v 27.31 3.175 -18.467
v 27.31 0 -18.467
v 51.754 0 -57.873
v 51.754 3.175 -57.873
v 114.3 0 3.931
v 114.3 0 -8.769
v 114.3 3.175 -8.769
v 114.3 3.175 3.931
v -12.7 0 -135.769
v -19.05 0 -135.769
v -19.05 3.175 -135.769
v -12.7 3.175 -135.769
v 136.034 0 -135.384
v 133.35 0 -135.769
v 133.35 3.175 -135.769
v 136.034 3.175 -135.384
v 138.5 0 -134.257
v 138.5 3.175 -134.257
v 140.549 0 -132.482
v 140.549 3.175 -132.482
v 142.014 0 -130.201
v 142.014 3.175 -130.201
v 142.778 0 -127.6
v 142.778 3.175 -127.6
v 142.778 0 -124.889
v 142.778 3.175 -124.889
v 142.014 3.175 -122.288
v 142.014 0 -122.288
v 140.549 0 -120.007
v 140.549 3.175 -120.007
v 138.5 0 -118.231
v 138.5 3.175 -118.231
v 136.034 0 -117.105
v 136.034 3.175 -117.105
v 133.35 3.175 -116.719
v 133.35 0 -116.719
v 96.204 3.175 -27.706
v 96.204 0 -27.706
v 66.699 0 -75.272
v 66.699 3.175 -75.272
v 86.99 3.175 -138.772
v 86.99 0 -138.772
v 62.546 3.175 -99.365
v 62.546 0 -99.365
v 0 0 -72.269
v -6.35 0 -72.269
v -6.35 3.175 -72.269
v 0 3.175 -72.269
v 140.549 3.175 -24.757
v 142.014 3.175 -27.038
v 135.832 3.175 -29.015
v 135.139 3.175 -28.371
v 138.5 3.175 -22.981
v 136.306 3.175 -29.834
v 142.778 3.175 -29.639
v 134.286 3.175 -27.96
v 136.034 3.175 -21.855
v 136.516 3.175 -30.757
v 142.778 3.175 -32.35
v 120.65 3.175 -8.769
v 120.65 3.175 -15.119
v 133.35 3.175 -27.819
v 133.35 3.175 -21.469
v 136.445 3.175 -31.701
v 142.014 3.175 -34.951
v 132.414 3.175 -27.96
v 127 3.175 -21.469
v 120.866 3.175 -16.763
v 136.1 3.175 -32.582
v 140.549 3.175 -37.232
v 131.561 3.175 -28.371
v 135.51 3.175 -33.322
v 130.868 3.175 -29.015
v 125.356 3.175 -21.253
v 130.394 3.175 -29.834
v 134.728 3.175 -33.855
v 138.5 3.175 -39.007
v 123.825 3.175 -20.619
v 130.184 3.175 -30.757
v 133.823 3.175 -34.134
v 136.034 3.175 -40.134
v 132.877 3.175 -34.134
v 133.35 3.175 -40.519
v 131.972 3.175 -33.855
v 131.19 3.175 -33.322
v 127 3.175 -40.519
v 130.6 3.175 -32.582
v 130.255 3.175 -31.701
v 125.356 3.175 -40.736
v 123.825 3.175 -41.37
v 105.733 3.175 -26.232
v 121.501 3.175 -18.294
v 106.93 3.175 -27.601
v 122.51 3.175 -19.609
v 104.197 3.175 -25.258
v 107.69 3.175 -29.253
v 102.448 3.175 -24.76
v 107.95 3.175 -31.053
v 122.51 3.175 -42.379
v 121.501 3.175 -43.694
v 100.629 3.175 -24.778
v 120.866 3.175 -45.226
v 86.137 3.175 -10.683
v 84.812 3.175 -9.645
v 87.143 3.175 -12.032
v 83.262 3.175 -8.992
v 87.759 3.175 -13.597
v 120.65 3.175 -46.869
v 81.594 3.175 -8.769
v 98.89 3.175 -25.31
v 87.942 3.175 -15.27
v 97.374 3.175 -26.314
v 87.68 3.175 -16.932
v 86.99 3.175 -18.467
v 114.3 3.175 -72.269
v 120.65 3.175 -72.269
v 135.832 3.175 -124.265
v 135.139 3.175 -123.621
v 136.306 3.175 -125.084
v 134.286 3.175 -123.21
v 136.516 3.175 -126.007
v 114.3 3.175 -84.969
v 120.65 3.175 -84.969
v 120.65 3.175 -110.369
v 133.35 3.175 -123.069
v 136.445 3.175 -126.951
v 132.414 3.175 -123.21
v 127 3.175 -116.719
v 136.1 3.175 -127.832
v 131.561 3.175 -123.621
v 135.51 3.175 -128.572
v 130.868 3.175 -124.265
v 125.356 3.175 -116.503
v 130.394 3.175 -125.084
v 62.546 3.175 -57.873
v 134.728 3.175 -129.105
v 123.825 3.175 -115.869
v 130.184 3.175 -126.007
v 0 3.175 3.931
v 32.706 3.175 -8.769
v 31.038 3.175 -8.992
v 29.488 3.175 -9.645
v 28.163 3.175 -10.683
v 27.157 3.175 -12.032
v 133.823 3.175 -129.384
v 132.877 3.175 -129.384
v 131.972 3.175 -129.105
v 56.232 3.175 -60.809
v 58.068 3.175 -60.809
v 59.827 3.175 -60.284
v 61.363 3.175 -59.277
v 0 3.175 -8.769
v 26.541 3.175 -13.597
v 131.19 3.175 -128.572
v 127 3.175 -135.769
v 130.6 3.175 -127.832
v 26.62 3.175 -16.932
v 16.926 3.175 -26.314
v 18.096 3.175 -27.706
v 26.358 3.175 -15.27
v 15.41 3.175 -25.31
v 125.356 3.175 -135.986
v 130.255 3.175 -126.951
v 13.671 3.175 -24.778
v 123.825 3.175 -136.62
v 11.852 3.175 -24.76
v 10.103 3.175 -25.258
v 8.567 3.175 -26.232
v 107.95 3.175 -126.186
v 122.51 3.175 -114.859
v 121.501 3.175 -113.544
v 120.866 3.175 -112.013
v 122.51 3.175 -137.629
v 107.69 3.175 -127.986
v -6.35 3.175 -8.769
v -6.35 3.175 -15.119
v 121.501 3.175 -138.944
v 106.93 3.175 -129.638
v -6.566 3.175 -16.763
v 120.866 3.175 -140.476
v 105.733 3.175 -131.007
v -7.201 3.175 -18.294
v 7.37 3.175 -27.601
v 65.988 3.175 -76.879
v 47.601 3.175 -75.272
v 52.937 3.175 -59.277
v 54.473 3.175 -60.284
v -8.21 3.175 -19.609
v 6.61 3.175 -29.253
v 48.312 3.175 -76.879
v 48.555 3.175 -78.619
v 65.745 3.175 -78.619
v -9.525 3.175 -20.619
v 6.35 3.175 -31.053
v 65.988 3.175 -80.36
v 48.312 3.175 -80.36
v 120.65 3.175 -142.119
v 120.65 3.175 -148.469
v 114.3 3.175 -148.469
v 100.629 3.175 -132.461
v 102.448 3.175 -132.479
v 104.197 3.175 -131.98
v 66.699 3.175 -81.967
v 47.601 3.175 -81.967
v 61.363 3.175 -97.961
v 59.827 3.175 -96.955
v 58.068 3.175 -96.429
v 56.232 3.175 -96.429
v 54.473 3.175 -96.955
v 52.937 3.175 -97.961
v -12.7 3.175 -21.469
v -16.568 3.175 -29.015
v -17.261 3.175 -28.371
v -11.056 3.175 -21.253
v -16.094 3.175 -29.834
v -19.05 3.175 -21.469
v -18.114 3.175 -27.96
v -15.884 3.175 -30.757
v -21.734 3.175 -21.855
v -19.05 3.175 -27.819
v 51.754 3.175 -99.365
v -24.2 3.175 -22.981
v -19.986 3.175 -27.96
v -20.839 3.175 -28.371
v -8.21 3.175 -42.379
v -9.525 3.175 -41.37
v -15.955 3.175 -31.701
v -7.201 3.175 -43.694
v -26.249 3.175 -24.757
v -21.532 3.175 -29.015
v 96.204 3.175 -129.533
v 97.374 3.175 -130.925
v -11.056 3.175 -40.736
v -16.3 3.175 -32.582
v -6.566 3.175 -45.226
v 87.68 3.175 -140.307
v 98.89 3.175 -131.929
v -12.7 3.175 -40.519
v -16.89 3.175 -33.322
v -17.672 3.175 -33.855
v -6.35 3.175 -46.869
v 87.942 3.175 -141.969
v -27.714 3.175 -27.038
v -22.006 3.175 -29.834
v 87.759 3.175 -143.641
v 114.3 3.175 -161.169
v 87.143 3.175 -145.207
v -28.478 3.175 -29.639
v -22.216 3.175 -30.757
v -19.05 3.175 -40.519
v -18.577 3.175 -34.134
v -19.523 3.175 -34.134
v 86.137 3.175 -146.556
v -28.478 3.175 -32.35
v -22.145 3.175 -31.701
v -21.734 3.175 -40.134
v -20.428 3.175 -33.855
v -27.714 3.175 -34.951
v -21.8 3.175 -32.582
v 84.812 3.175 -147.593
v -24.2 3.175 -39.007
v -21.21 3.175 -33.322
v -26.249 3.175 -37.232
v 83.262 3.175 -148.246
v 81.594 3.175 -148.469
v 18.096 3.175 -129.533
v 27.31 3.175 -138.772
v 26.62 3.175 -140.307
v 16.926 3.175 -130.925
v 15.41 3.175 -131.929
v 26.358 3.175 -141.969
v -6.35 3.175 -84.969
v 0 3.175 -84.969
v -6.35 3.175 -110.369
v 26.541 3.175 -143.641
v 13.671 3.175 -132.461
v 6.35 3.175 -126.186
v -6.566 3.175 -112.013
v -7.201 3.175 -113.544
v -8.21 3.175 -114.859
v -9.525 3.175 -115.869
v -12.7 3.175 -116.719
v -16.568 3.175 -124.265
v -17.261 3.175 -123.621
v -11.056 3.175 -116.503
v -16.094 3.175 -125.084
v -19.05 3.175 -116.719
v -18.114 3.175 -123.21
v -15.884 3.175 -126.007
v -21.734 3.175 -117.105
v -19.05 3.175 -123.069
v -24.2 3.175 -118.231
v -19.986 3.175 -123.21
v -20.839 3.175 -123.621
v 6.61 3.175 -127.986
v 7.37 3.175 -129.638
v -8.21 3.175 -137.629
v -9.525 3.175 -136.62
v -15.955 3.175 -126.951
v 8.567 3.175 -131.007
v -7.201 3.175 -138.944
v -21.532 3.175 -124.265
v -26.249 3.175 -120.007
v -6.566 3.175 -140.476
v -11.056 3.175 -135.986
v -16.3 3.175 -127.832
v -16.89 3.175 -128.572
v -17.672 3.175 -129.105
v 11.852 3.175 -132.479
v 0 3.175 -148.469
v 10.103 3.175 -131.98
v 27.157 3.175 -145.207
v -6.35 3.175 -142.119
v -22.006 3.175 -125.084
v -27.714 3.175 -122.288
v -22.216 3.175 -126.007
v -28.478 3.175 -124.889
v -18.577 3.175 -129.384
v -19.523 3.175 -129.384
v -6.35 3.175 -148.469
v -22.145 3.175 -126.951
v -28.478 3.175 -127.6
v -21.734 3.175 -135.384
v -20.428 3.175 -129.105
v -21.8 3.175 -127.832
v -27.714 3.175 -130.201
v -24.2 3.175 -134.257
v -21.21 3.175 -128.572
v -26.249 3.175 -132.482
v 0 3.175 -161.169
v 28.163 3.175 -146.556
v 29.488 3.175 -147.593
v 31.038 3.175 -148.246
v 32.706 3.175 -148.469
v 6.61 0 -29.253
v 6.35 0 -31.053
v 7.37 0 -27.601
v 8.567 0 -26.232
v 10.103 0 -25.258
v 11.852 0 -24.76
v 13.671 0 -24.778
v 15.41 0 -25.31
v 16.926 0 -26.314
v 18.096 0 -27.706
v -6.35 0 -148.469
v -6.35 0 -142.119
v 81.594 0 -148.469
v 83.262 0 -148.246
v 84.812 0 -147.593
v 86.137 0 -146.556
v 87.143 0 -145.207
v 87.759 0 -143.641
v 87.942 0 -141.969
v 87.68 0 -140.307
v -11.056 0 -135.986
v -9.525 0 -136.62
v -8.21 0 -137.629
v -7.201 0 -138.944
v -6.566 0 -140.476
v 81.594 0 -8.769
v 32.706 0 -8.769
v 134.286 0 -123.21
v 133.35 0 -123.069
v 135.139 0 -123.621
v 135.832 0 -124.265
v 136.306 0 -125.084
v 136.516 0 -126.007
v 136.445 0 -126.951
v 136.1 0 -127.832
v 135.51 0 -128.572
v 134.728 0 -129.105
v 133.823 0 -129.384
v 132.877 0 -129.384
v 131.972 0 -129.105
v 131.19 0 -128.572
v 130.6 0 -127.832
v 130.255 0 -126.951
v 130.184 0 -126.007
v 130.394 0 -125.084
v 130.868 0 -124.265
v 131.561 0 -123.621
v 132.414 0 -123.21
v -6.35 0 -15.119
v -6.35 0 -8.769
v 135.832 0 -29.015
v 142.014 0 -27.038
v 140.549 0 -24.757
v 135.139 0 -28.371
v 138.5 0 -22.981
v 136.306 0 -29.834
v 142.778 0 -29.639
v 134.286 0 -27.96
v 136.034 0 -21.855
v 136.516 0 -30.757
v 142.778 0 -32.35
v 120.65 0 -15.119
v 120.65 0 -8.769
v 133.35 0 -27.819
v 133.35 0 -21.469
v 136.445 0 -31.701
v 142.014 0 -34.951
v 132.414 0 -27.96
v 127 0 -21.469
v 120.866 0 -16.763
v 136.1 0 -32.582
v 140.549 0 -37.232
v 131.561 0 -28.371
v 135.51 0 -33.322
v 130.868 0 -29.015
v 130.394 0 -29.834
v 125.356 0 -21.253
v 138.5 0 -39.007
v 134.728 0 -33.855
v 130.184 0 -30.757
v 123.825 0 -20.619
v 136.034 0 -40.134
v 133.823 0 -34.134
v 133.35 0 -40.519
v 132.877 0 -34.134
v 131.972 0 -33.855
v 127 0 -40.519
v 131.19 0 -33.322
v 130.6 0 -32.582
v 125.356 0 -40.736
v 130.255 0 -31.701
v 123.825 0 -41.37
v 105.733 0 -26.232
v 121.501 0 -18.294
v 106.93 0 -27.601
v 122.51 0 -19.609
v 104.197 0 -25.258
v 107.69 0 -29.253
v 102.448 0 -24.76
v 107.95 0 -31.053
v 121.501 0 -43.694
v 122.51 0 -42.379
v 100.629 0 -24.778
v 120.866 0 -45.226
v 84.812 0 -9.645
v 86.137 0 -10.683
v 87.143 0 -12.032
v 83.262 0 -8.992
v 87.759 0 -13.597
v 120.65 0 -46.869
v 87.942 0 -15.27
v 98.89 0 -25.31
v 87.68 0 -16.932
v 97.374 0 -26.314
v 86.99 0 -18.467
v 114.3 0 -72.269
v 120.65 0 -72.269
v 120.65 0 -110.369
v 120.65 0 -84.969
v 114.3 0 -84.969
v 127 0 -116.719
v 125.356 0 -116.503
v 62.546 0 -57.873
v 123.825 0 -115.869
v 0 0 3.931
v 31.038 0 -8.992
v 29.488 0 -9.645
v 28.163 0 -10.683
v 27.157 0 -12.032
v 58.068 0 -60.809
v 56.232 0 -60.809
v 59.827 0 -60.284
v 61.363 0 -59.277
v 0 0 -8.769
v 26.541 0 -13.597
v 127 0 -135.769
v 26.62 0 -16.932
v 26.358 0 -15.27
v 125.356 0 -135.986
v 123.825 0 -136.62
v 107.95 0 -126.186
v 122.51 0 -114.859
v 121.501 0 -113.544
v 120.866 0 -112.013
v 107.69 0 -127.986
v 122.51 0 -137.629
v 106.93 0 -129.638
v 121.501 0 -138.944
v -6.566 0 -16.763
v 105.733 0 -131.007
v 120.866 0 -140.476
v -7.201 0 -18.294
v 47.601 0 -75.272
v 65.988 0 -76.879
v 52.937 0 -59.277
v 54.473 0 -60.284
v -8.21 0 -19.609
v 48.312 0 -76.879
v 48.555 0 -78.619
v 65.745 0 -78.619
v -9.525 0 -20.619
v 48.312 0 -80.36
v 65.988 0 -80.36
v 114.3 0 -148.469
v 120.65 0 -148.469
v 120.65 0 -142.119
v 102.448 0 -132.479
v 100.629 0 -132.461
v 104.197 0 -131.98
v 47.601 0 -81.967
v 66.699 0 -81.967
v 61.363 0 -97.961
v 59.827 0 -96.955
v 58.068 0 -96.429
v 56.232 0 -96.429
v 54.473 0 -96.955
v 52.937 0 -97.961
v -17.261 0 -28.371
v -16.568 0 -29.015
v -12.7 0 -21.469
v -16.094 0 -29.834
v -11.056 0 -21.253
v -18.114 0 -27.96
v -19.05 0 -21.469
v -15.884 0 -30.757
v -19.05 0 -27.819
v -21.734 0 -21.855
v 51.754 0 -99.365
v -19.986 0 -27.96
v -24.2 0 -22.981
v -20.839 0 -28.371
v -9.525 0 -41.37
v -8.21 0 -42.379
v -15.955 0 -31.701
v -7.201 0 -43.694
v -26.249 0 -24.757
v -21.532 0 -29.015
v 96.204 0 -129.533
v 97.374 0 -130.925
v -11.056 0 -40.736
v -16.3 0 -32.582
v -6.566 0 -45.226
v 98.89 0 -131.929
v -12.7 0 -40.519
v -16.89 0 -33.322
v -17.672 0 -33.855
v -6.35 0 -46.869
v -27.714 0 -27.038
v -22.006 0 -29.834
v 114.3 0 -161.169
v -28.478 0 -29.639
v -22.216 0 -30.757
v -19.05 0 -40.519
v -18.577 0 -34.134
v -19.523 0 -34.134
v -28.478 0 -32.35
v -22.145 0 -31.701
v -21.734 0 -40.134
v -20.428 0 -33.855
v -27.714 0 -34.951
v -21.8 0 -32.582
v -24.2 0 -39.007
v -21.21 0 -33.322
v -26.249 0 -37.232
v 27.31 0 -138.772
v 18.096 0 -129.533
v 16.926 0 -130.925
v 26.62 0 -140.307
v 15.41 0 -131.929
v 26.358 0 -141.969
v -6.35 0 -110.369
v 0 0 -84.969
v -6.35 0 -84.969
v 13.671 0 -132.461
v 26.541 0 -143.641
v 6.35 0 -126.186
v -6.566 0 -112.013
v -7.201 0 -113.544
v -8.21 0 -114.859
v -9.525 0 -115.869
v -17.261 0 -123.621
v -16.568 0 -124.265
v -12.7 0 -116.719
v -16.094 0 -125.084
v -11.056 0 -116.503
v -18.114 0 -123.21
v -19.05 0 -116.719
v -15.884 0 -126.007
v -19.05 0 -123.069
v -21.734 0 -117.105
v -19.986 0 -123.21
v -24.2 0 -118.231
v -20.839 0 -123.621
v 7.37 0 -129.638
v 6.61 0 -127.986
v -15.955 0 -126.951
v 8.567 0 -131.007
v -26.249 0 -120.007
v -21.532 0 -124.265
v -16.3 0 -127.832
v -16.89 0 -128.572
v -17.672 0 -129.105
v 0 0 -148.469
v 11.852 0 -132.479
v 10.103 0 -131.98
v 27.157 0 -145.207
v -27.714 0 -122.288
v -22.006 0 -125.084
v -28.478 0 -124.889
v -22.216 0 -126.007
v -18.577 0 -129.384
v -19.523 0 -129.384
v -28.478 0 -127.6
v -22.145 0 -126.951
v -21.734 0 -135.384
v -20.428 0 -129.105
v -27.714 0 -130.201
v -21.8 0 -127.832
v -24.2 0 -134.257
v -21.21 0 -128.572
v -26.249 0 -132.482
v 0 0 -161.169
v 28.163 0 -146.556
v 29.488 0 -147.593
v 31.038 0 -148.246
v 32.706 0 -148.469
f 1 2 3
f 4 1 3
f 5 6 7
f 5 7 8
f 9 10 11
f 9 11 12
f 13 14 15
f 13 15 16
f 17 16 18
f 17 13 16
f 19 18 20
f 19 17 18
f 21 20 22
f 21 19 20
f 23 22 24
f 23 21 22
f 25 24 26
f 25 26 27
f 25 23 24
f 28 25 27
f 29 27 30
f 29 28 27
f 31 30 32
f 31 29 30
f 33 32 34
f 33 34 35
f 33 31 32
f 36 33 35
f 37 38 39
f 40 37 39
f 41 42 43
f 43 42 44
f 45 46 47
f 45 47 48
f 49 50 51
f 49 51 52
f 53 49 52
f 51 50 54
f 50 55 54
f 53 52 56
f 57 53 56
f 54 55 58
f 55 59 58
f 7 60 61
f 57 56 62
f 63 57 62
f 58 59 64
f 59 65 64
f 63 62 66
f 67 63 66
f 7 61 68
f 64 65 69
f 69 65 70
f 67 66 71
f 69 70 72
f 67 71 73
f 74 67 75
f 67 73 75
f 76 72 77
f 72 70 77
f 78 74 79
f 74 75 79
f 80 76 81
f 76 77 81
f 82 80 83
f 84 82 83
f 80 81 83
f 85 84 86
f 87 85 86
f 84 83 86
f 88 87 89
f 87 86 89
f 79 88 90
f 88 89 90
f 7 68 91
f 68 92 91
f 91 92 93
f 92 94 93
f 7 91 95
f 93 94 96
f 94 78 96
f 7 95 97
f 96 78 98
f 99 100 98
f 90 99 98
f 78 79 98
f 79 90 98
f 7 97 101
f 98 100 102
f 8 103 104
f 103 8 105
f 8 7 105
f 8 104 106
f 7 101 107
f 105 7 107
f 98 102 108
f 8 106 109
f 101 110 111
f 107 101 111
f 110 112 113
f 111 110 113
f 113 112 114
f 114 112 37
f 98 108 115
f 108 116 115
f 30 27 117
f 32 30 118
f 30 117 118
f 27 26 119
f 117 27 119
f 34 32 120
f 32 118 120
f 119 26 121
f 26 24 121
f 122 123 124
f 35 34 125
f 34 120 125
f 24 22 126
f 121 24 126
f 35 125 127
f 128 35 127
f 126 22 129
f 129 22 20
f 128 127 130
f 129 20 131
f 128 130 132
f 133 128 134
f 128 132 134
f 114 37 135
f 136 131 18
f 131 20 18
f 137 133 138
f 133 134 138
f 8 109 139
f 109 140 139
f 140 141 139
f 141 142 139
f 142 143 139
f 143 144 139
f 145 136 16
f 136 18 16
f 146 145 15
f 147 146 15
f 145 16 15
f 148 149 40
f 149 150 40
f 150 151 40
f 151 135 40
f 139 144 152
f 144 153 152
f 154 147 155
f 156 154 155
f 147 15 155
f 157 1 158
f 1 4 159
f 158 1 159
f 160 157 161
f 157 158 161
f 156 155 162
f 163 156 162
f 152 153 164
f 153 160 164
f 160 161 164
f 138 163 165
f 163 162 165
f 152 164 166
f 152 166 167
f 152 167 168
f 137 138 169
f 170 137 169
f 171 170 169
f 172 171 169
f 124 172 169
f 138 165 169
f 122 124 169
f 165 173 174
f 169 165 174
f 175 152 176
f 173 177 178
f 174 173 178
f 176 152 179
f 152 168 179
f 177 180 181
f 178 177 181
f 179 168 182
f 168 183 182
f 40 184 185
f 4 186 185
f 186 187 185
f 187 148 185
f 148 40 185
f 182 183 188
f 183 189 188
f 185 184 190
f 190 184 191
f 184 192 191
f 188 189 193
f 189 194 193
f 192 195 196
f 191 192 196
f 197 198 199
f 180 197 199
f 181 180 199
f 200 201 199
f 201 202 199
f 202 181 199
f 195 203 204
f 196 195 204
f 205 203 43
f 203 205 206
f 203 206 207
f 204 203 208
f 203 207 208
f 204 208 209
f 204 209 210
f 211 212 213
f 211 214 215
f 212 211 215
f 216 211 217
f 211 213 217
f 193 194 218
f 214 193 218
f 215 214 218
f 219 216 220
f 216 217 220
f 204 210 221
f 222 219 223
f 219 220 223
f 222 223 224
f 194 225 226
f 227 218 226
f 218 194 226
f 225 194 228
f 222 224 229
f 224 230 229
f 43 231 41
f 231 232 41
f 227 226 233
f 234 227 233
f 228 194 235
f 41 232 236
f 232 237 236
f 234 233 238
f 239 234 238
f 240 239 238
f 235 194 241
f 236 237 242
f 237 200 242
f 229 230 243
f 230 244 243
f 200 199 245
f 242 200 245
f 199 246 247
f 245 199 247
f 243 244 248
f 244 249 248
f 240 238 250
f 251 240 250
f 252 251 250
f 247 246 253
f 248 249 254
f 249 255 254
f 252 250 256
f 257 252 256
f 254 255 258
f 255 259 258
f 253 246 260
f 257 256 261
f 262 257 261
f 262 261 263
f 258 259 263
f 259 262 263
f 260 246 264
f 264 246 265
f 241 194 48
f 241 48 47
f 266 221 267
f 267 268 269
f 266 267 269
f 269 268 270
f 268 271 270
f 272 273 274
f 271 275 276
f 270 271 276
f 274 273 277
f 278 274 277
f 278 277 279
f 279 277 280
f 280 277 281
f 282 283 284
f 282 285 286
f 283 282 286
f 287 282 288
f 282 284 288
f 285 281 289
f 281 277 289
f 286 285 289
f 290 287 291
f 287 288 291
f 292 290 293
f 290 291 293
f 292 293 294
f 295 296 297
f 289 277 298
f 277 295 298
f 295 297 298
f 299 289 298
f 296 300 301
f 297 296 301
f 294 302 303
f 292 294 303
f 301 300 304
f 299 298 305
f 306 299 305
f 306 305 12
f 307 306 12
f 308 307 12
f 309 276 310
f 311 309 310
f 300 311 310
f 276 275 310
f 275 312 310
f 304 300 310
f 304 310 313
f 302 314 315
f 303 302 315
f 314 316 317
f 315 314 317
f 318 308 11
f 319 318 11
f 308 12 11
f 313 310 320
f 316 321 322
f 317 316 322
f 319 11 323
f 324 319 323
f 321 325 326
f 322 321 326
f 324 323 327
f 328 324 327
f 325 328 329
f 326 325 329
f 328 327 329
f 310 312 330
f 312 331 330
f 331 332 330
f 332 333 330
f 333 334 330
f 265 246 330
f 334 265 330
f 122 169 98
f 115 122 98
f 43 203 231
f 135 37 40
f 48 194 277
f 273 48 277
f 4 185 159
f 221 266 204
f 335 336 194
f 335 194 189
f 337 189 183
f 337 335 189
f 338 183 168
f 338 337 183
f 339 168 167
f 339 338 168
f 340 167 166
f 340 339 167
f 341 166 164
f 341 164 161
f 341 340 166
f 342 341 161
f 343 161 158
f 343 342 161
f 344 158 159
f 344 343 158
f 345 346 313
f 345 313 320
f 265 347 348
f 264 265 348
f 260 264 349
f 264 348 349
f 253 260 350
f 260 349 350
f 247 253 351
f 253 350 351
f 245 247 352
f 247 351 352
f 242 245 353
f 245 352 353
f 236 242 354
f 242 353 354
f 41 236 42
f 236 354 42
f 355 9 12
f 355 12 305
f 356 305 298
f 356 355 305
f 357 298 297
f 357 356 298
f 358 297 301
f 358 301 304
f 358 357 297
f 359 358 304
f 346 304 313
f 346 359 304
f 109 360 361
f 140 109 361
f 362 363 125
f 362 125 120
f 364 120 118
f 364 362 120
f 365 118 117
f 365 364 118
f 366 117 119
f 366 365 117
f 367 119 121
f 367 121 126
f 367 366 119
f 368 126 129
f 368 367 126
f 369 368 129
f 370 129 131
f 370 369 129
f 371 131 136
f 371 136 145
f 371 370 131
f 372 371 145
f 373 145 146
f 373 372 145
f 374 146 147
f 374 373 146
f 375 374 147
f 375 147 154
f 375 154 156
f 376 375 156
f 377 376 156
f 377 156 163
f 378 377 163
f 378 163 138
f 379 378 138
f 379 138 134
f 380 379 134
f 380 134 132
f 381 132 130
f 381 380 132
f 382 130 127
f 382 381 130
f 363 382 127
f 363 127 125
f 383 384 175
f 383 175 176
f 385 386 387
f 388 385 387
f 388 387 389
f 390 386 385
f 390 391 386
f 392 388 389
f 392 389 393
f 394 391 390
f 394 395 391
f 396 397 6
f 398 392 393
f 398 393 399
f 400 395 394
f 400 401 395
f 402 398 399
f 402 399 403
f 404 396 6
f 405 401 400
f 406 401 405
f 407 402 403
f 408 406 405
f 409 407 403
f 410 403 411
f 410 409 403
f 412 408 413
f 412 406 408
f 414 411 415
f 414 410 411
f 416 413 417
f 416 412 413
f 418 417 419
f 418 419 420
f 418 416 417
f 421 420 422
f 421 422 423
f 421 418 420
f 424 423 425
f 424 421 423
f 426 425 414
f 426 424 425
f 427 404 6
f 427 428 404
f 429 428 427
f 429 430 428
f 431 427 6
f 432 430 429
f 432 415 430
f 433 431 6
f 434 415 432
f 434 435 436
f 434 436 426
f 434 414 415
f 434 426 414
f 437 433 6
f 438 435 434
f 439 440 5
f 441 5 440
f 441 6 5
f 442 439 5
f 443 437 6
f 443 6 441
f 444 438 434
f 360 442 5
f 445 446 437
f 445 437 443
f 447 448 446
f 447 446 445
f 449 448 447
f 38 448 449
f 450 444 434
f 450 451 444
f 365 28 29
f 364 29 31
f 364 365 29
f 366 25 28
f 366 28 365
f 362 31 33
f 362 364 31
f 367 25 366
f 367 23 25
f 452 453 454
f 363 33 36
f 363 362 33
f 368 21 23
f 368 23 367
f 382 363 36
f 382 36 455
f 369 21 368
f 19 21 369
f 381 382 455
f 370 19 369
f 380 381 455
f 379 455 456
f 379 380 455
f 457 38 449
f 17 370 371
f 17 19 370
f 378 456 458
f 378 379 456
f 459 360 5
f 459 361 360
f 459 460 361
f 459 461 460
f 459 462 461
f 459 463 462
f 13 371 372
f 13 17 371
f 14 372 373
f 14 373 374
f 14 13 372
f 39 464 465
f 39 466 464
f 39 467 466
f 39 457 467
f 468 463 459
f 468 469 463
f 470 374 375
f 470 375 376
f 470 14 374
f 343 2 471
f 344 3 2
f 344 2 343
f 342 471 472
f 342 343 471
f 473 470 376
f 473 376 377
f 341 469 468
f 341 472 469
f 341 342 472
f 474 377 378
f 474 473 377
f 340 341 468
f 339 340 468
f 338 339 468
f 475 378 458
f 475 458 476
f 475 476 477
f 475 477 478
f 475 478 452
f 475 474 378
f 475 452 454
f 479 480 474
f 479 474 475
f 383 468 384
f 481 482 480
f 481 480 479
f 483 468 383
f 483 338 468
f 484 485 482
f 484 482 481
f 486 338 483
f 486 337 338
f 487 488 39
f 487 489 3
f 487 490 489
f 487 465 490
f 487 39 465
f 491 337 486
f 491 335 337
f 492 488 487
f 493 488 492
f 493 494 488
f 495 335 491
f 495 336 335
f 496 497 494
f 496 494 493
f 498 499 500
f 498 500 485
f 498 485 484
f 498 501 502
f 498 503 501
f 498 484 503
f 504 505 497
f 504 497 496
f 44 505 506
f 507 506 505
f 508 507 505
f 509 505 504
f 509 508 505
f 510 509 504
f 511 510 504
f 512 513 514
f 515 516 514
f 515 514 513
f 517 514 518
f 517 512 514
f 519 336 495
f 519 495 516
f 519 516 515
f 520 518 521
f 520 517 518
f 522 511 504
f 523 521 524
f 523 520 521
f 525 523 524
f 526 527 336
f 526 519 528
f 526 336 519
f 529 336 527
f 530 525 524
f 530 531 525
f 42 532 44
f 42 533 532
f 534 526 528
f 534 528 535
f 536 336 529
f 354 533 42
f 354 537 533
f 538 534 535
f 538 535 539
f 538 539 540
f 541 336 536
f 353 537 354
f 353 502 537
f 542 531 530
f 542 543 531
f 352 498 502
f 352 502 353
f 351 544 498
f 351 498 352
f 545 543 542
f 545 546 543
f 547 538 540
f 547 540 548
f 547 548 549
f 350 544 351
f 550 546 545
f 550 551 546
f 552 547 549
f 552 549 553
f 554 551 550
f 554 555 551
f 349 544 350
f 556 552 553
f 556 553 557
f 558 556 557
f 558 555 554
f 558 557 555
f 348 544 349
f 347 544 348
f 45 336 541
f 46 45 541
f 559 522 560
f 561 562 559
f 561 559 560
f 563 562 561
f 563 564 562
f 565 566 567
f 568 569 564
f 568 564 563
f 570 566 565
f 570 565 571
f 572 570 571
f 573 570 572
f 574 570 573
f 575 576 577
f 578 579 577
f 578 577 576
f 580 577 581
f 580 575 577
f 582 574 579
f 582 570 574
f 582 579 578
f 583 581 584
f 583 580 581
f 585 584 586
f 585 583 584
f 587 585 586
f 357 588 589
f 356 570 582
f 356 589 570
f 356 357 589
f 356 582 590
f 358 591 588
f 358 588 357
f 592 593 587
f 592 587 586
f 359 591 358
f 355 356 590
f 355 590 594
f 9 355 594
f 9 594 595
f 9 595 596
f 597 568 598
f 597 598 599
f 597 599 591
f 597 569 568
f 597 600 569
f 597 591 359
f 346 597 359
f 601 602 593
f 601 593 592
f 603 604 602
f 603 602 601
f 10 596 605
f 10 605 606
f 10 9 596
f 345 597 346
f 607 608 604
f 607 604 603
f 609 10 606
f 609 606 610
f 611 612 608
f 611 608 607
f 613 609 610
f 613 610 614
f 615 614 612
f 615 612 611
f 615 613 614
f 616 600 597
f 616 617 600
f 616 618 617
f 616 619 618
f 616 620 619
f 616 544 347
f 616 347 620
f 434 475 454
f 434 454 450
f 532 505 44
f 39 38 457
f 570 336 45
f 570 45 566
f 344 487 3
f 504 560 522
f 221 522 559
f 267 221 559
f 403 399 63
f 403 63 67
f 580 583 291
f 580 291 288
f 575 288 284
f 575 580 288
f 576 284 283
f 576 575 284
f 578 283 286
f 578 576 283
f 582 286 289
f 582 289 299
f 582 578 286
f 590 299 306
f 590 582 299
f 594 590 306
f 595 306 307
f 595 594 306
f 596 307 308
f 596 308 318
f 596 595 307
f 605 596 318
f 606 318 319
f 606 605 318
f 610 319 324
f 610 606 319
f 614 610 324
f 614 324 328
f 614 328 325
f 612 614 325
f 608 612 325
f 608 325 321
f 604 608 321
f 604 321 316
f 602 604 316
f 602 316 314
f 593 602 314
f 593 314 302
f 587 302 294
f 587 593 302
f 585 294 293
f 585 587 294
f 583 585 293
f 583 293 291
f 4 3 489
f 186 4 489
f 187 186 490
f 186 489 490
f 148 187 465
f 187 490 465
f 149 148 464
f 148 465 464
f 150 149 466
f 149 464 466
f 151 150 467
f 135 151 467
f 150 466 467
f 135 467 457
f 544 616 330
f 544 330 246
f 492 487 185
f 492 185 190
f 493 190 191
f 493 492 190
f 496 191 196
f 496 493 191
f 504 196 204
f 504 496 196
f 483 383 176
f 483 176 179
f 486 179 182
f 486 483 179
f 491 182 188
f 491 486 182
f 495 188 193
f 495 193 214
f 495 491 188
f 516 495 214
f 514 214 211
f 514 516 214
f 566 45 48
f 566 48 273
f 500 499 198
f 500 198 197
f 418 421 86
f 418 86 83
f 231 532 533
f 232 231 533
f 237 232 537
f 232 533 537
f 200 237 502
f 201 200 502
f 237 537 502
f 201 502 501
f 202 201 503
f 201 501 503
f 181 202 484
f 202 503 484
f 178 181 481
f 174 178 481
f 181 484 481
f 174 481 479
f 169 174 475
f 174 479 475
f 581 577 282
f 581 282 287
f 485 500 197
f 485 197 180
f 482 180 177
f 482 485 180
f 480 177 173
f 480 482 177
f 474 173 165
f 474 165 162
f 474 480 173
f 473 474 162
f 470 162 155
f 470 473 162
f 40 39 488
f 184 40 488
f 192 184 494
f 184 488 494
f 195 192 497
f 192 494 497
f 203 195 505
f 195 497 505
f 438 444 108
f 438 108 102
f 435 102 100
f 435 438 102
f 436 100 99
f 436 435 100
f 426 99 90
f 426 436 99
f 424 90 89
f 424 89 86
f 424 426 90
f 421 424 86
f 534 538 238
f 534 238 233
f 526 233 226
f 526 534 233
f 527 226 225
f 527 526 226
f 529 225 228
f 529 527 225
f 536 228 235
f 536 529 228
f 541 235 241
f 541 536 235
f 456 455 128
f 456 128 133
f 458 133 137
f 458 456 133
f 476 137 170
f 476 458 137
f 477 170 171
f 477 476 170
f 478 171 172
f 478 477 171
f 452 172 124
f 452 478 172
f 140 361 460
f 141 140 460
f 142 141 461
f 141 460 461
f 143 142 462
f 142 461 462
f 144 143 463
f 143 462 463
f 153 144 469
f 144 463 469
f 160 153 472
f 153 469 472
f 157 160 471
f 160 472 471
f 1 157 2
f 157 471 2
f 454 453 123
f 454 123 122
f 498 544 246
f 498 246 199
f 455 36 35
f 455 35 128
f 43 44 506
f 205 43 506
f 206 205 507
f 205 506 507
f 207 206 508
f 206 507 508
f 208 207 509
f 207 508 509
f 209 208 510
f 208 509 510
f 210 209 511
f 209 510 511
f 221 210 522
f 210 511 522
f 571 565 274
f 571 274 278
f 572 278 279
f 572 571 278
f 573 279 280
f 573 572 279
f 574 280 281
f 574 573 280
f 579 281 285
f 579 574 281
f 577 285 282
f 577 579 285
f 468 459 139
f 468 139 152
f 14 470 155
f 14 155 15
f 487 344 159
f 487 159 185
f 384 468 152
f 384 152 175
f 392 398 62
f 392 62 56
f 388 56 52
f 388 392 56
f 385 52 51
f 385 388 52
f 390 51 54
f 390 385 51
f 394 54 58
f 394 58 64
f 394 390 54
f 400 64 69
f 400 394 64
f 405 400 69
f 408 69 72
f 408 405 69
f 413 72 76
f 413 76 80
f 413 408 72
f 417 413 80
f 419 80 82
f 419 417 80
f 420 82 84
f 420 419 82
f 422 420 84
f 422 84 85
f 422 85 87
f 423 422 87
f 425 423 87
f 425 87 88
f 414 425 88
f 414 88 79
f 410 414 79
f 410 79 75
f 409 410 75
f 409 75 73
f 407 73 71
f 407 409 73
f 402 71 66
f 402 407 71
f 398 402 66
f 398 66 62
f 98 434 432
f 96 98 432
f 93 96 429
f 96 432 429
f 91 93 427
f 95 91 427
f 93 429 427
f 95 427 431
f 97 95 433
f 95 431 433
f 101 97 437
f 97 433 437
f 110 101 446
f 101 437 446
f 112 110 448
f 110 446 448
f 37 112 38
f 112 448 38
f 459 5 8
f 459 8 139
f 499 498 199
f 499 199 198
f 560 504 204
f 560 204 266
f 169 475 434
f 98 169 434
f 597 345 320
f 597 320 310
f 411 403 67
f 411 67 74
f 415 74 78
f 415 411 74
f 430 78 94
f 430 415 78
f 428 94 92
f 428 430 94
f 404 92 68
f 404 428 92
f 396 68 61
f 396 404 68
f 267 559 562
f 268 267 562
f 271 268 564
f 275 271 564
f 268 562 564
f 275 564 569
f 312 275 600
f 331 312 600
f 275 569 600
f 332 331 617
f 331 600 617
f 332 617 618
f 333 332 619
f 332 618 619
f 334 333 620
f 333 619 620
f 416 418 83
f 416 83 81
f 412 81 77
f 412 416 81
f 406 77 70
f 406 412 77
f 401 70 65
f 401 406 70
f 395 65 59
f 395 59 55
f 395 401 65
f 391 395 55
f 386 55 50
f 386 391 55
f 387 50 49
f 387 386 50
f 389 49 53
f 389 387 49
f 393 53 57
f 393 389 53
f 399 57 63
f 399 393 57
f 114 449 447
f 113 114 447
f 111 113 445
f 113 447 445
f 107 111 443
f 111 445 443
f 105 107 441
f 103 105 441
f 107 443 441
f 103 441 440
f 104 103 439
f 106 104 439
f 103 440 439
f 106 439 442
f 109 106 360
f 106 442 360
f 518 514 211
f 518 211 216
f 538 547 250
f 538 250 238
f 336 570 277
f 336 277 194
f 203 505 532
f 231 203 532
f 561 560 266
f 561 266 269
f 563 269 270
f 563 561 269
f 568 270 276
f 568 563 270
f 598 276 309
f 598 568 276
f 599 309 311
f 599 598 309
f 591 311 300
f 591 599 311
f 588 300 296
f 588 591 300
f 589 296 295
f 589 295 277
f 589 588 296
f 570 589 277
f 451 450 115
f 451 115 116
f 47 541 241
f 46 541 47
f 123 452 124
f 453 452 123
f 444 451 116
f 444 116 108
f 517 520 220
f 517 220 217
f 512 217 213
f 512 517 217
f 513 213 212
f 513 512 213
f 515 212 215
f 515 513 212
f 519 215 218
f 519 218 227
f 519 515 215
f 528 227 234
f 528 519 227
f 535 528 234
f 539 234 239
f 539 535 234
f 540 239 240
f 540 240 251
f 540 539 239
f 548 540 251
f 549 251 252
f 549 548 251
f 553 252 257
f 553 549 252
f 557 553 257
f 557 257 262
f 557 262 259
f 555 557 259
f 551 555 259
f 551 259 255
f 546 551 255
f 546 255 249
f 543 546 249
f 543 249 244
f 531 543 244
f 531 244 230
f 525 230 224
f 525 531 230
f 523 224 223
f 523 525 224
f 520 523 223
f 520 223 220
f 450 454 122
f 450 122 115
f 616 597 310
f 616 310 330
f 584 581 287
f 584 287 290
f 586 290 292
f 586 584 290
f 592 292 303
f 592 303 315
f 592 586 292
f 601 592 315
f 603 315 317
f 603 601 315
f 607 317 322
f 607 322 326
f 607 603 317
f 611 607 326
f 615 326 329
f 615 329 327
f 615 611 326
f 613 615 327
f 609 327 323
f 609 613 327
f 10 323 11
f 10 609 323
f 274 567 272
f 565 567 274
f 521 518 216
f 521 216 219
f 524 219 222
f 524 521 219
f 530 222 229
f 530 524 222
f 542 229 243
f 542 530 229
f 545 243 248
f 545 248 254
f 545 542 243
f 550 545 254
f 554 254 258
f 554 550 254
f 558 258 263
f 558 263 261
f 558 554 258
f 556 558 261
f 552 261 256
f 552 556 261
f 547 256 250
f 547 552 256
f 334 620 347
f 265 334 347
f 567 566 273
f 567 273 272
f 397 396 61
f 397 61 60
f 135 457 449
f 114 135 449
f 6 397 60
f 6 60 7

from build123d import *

# Parameters (mm, degrees)
SKETCH1_R           = 3.175
BOSS_EXTRUDE1_DEPTH = 3.175


with BuildPart() as part:
    # Sketch1 → Boss-Extrude1 (new body)
    with BuildSketch(Plane(origin=(0, 0, 0), x_dir=(1, 0, 0), z_dir=(0, 1, 0))):
        with BuildLine():
            Line((0, 161.169349013), (114.3, 161.169349013))
            Line((114.3, 161.169349013), (114.3, 148.469349013))
            Line((114.3, 148.469349013), (120.65, 148.469349013))
            Line((120.65, 148.469349013), (120.65, 142.119349013))
            ThreePointArc((120.65, 142.119349013), (122.509871939, 137.629220953), (127, 135.769349013))
            Line((127, 135.769349013), (133.35, 135.769349013))
            ThreePointArc((133.35, 135.769349013), (142.875, 126.244349013), (133.35, 116.719349013))
            Line((133.35, 116.719349013), (127, 116.719349013))
            ThreePointArc((127, 116.719349013), (122.509871939, 114.859477074), (120.65, 110.369349013))
            Line((120.65, 110.369349013), (120.65, 84.969349013))
            Line((120.65, 84.969349013), (114.3, 84.969349013))
            Line((114.3, 84.969349013), (114.3, 72.269349013))
            Line((114.3, 72.269349013), (120.65, 72.269349013))
            Line((120.65, 72.269349013), (120.65, 46.869349013))
            ThreePointArc((120.65, 46.869349013), (122.509871939, 42.379220953), (127, 40.519349013))
            Line((127, 40.519349013), (133.35, 40.519349013))
            ThreePointArc((133.35, 40.519349013), (142.875, 30.994349013), (133.35, 21.469349013))
            Line((133.35, 21.469349013), (127, 21.469349013))
            ThreePointArc((127, 21.469349013), (122.509871939, 19.609477074), (120.65, 15.119349013))
            Line((120.65, 15.119349013), (120.65, 8.769349013))
            Line((120.65, 8.769349013), (114.3, 8.769349013))
            Line((114.3, 8.769349013), (114.3, -3.930650987))
            Line((114.3, -3.930650987), (0, -3.930650987))
            Line((0, -3.930650987), (0, 8.769349013))
            Line((0, 8.769349013), (-6.35, 8.769349013))
            Line((-6.35, 8.769349013), (-6.35, 15.119349013))
            ThreePointArc((-6.35, 15.119349013), (-8.209871939, 19.609477074), (-12.7, 21.469349013))
            Line((-12.7, 21.469349013), (-19.05, 21.469349013))
            ThreePointArc((-19.05, 21.469349013), (-28.575, 30.994349013), (-19.05, 40.519349013))
            Line((-19.05, 40.519349013), (-12.7, 40.519349013))
            ThreePointArc((-12.7, 40.519349013), (-8.209871939, 42.379220953), (-6.35, 46.869349013))
            Line((-6.35, 46.869349013), (-6.35, 72.269349013))
            Line((-6.35, 72.269349013), (0, 72.269349013))
            Line((0, 72.269349013), (0, 84.969349013))
            Line((0, 84.969349013), (-6.35, 84.969349013))
            Line((-6.35, 84.969349013), (-6.35, 110.369349013))
            ThreePointArc((-6.35, 110.369349013), (-8.209871939, 114.859477074), (-12.7, 116.719349013))
            Line((-12.7, 116.719349013), (-19.05, 116.719349013))
            ThreePointArc((-19.05, 116.719349013), (-28.575, 126.244349013), (-19.05, 135.769349013))
            Line((-19.05, 135.769349013), (-12.7, 135.769349013))
            ThreePointArc((-12.7, 135.769349013), (-8.209871939, 137.629220953), (-6.35, 142.119349013))
            Line((-6.35, 142.119349013), (-6.35, 148.469349013))
            Line((-6.35, 148.469349013), (0, 148.469349013))
            Line((0, 148.469349013), (0, 161.169349013))
        make_face()
        with Locations(Location((-19.05, 126.244349013, 0), (0, 0, 270))):
            Circle(SKETCH1_R, mode=Mode.SUBTRACT)
        with Locations(Location((-19.05, 30.994349013, 0), (0, 0, 270))):
            Circle(SKETCH1_R, mode=Mode.SUBTRACT)
        with Locations(Location((133.35, 30.994349013, 0), (0, 0, 270))):
            Circle(SKETCH1_R, mode=Mode.SUBTRACT)
        with Locations(Location((133.35, 126.244349013, 0), (0, 0, 270))):
            Circle(SKETCH1_R, mode=Mode.SUBTRACT)
        with BuildLine():
            Line((107.95, 126.185693187), (107.95, 31.05300484))
            ThreePointArc((107.95, 31.05300484), (103.340232575, 24.946116059), (96.203829737, 27.705790103))
            Line((96.203829737, 27.705790103), (66.698688048, 75.272134277))
            ThreePointArc((66.698688048, 75.272134277), (65.744858311, 78.619349013), (66.698688048, 81.96656375))
            Line((66.698688048, 81.96656375), (96.203829737, 129.532907923))
            ThreePointArc((96.203829737, 129.532907923), (103.340232575, 132.292581968), (107.95, 126.185693187))
        make_face(mode=Mode.SUBTRACT)
        with BuildLine():
            Line((81.593842457, 8.769349013), (32.706157543, 8.769349013))
            ThreePointArc((32.706157543, 8.769349013), (27.157404819, 12.031656799), (27.30998728, 18.46656375))
            Line((27.30998728, 18.46656375), (51.753829737, 57.873397836))
            ThreePointArc((51.753829737, 57.873397836), (57.15, 60.876183099), (62.546170263, 57.873397836))
            Line((62.546170263, 57.873397836), (86.99001272, 18.46656375))
            ThreePointArc((86.99001272, 18.46656375), (87.142595181, 12.031656799), (81.593842457, 8.769349013))
        make_face(mode=Mode.SUBTRACT)
        with BuildLine():
            Line((6.35, 126.185693187), (6.35, 31.05300484))
            ThreePointArc((6.35, 31.05300484), (10.959767425, 24.946116059), (18.096170263, 27.705790103))
            Line((18.096170263, 27.705790103), (47.601311952, 75.272134277))
            ThreePointArc((47.601311952, 75.272134277), (48.555141689, 78.619349013), (47.601311952, 81.96656375))
            Line((47.601311952, 81.96656375), (18.096170263, 129.532907923))
            ThreePointArc((18.096170263, 129.532907923), (10.959767425, 132.292581968), (6.35, 126.185693187))
        make_face(mode=Mode.SUBTRACT)
        with BuildLine():
            Line((86.99001272, 138.772134277), (62.546170263, 99.36530019))
            ThreePointArc((62.546170263, 99.36530019), (57.15, 96.362514927), (51.753829737, 99.36530019))
            Line((51.753829737, 99.36530019), (27.30998728, 138.772134277))
            ThreePointArc((27.30998728, 138.772134277), (27.157404819, 145.207041228), (32.706157543, 148.469349013))
            Line((32.706157543, 148.469349013), (81.593842457, 148.469349013))
            ThreePointArc((81.593842457, 148.469349013), (87.142595181, 145.207041228), (86.99001272, 138.772134277))
        make_face(mode=Mode.SUBTRACT)
    extrude(amount=BOSS_EXTRUDE1_DEPTH)


solid = part.part
